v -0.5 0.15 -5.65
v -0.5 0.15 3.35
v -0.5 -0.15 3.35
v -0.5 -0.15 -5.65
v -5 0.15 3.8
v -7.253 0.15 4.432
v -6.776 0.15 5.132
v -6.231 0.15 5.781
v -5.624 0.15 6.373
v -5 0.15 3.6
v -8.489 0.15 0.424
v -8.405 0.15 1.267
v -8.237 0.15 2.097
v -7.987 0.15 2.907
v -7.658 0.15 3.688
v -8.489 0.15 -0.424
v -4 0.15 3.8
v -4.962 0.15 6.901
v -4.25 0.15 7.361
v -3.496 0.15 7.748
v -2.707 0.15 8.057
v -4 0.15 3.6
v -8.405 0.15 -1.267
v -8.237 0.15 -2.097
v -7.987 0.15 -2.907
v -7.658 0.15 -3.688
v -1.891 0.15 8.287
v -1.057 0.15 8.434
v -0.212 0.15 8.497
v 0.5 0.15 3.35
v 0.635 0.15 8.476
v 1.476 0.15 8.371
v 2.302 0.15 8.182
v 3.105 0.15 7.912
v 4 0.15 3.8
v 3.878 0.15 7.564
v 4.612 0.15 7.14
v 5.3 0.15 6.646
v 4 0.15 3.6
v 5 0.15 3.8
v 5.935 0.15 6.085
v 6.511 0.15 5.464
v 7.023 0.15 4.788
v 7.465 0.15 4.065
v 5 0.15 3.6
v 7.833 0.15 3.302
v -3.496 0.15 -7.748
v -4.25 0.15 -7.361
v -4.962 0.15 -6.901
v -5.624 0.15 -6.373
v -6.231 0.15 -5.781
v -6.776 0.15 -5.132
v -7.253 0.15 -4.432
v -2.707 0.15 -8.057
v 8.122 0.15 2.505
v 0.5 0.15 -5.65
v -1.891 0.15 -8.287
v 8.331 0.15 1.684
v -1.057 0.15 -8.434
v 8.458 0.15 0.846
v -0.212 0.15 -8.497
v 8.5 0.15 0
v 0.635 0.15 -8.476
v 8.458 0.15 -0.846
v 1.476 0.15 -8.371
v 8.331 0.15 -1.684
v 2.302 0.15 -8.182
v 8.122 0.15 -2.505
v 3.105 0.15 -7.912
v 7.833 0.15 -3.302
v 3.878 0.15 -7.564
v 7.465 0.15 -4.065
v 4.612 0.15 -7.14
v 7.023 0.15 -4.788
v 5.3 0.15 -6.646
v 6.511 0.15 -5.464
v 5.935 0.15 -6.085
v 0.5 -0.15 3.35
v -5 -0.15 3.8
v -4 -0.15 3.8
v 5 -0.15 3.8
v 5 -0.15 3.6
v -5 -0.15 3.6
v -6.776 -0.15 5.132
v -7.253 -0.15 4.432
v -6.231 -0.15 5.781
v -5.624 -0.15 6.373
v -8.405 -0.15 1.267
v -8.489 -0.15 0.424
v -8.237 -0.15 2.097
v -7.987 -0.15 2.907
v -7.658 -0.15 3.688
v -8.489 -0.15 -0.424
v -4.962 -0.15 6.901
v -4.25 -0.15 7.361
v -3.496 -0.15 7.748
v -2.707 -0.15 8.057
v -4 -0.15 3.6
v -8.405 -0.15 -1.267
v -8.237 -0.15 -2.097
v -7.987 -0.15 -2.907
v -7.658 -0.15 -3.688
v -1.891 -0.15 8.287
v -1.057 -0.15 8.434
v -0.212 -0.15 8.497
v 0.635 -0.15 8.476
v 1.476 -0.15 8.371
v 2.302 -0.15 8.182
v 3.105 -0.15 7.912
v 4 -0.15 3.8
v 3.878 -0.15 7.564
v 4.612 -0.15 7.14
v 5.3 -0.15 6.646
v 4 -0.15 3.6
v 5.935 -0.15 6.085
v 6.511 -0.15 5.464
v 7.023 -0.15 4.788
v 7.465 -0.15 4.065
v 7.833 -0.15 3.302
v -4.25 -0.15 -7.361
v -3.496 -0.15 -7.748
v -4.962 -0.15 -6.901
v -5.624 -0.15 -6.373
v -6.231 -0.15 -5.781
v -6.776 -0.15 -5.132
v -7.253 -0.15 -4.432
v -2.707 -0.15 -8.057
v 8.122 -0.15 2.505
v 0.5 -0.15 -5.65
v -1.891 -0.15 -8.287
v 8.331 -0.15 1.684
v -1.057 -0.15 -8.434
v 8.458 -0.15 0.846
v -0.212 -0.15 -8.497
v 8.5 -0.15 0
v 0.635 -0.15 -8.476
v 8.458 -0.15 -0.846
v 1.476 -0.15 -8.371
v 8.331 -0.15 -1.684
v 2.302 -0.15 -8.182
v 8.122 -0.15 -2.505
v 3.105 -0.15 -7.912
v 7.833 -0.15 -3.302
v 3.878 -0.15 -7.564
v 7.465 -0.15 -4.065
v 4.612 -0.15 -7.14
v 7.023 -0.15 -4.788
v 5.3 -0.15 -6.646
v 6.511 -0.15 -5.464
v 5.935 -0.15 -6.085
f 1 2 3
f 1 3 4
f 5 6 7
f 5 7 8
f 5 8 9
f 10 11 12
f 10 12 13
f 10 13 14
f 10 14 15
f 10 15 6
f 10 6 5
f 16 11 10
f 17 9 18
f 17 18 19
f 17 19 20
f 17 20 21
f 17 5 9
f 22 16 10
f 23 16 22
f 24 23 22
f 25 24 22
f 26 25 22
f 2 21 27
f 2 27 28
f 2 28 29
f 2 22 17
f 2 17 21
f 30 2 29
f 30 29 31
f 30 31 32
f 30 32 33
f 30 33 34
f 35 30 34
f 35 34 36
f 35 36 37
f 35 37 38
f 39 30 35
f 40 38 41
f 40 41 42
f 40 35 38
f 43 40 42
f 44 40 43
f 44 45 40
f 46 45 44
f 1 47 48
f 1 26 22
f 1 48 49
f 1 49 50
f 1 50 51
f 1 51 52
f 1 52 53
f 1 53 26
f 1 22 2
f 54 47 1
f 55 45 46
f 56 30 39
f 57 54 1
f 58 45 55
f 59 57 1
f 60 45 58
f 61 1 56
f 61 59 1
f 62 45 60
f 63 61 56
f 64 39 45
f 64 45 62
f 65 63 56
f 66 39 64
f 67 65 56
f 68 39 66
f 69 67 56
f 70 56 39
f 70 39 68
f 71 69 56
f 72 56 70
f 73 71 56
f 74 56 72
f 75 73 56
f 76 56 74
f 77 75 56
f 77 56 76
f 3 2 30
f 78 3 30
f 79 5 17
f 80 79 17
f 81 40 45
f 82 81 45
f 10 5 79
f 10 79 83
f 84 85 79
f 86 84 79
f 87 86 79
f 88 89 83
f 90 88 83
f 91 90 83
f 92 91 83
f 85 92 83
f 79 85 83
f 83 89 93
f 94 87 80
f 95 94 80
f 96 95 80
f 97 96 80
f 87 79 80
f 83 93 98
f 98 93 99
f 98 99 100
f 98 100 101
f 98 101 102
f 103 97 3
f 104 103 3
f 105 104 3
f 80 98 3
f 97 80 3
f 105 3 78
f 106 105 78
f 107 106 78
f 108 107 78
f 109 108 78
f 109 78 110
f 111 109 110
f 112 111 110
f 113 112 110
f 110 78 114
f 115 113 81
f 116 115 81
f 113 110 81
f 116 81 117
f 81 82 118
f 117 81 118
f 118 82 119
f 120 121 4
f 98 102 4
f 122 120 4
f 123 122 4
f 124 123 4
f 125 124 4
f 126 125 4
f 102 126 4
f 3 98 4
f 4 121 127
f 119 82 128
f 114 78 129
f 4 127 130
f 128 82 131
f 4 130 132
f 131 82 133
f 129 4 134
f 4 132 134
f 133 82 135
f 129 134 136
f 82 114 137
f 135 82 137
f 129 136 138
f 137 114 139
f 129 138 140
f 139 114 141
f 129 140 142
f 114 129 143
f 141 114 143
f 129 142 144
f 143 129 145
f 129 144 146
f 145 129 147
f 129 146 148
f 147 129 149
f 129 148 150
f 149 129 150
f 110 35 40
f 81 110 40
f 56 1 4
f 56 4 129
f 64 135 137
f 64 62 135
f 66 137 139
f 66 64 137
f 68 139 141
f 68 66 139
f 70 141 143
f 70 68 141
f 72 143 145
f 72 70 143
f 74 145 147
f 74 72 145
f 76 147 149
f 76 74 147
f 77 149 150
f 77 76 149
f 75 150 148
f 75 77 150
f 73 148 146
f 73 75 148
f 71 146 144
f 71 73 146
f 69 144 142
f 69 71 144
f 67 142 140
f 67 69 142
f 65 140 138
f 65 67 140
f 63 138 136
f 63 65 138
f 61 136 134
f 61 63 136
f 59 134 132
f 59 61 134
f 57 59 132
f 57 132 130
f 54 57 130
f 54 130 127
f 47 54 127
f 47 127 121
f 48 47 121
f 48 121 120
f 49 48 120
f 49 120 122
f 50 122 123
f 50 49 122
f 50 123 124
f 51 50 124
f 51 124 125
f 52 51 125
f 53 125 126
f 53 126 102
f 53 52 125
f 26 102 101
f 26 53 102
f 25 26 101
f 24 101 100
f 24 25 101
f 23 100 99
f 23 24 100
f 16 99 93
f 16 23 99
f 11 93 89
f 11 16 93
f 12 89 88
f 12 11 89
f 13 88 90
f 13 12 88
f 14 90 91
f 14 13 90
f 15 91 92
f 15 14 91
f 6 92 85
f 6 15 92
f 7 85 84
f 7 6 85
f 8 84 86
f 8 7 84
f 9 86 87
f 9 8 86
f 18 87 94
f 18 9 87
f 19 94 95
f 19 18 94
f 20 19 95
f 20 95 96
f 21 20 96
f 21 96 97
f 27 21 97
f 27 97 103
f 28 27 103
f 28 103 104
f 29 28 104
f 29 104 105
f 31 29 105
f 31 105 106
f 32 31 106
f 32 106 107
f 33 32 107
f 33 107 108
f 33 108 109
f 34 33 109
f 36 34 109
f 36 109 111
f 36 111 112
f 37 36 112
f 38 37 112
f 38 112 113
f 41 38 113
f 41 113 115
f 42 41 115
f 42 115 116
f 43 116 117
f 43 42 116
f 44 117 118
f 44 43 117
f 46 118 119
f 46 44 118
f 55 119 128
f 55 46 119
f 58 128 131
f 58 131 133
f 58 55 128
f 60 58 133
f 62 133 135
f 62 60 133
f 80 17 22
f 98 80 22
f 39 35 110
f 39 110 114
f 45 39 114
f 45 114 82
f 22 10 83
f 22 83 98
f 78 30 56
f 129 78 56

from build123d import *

# Parameters (mm, degrees)
SKETCH1_R           = 8.5
BOSS_EXTRUDE1_DEPTH = 0.15
CUT_EXTRUDE1_REACH  = 2.3
SKETCH2_W           = 1
SKETCH2_H           = 9
SKETCH2_H_2         = 0.2


with BuildPart() as part:
    # Sketch1 → Boss-Extrude1 (new body, symmetric)
    with BuildSketch(Plane(origin=(0, 0, 0), x_dir=(1, 0, 0), z_dir=(0, 1, 0))):
        Circle(SKETCH1_R)
    extrude(amount=BOSS_EXTRUDE1_DEPTH, both=True)

    # Sketch2 → Cut-Extrude1 (cut, up to next)
    with BuildSketch(Plane(origin=(0, 0.15, 0), x_dir=(1, 0, 0), z_dir=(0, 1, 0)), mode=Mode.PRIVATE) as cut_extrude1_sk1:
        with Locations((0, 1.15)):
            Rectangle(SKETCH2_W, SKETCH2_H)
    cut_extrude1_tool1 = extrude(cut_extrude1_sk1.sketch, amount=-CUT_EXTRUDE1_REACH, mode=Mode.PRIVATE) & part.part
    add(cut_extrude1_tool1.solids().sort_by_distance((0, 0.15, -1.15))[0], mode=Mode.SUBTRACT)
    # Sketch2 → Cut-Extrude1 (cut, up to next)
    with BuildSketch(Plane(origin=(0, 0.15, 0), x_dir=(1, 0, 0), z_dir=(0, 1, 0)), mode=Mode.PRIVATE) as cut_extrude1_sk2:
        with Locations((4.5, -3.7)):
            Rectangle(SKETCH2_W, SKETCH2_H_2)
    cut_extrude1_tool2 = extrude(cut_extrude1_sk2.sketch, amount=-CUT_EXTRUDE1_REACH, mode=Mode.PRIVATE) & part.part
    add(cut_extrude1_tool2.solids().sort_by_distance((4.5, 0.15, 3.7))[0], mode=Mode.SUBTRACT)
    # Sketch2 → Cut-Extrude1 (cut, up to next)
    with BuildSketch(Plane(origin=(0, 0.15, 0), x_dir=(1, 0, 0), z_dir=(0, 1, 0)), mode=Mode.PRIVATE) as cut_extrude1_sk3:
        with Locations((-4.5, -3.7)):
            Rectangle(SKETCH2_W, SKETCH2_H_2)
    cut_extrude1_tool3 = extrude(cut_extrude1_sk3.sketch, amount=-CUT_EXTRUDE1_REACH, mode=Mode.PRIVATE) & part.part
    add(cut_extrude1_tool3.solids().sort_by_distance((-4.5, 0.15, 3.7))[0], mode=Mode.SUBTRACT)


solid = part.part
